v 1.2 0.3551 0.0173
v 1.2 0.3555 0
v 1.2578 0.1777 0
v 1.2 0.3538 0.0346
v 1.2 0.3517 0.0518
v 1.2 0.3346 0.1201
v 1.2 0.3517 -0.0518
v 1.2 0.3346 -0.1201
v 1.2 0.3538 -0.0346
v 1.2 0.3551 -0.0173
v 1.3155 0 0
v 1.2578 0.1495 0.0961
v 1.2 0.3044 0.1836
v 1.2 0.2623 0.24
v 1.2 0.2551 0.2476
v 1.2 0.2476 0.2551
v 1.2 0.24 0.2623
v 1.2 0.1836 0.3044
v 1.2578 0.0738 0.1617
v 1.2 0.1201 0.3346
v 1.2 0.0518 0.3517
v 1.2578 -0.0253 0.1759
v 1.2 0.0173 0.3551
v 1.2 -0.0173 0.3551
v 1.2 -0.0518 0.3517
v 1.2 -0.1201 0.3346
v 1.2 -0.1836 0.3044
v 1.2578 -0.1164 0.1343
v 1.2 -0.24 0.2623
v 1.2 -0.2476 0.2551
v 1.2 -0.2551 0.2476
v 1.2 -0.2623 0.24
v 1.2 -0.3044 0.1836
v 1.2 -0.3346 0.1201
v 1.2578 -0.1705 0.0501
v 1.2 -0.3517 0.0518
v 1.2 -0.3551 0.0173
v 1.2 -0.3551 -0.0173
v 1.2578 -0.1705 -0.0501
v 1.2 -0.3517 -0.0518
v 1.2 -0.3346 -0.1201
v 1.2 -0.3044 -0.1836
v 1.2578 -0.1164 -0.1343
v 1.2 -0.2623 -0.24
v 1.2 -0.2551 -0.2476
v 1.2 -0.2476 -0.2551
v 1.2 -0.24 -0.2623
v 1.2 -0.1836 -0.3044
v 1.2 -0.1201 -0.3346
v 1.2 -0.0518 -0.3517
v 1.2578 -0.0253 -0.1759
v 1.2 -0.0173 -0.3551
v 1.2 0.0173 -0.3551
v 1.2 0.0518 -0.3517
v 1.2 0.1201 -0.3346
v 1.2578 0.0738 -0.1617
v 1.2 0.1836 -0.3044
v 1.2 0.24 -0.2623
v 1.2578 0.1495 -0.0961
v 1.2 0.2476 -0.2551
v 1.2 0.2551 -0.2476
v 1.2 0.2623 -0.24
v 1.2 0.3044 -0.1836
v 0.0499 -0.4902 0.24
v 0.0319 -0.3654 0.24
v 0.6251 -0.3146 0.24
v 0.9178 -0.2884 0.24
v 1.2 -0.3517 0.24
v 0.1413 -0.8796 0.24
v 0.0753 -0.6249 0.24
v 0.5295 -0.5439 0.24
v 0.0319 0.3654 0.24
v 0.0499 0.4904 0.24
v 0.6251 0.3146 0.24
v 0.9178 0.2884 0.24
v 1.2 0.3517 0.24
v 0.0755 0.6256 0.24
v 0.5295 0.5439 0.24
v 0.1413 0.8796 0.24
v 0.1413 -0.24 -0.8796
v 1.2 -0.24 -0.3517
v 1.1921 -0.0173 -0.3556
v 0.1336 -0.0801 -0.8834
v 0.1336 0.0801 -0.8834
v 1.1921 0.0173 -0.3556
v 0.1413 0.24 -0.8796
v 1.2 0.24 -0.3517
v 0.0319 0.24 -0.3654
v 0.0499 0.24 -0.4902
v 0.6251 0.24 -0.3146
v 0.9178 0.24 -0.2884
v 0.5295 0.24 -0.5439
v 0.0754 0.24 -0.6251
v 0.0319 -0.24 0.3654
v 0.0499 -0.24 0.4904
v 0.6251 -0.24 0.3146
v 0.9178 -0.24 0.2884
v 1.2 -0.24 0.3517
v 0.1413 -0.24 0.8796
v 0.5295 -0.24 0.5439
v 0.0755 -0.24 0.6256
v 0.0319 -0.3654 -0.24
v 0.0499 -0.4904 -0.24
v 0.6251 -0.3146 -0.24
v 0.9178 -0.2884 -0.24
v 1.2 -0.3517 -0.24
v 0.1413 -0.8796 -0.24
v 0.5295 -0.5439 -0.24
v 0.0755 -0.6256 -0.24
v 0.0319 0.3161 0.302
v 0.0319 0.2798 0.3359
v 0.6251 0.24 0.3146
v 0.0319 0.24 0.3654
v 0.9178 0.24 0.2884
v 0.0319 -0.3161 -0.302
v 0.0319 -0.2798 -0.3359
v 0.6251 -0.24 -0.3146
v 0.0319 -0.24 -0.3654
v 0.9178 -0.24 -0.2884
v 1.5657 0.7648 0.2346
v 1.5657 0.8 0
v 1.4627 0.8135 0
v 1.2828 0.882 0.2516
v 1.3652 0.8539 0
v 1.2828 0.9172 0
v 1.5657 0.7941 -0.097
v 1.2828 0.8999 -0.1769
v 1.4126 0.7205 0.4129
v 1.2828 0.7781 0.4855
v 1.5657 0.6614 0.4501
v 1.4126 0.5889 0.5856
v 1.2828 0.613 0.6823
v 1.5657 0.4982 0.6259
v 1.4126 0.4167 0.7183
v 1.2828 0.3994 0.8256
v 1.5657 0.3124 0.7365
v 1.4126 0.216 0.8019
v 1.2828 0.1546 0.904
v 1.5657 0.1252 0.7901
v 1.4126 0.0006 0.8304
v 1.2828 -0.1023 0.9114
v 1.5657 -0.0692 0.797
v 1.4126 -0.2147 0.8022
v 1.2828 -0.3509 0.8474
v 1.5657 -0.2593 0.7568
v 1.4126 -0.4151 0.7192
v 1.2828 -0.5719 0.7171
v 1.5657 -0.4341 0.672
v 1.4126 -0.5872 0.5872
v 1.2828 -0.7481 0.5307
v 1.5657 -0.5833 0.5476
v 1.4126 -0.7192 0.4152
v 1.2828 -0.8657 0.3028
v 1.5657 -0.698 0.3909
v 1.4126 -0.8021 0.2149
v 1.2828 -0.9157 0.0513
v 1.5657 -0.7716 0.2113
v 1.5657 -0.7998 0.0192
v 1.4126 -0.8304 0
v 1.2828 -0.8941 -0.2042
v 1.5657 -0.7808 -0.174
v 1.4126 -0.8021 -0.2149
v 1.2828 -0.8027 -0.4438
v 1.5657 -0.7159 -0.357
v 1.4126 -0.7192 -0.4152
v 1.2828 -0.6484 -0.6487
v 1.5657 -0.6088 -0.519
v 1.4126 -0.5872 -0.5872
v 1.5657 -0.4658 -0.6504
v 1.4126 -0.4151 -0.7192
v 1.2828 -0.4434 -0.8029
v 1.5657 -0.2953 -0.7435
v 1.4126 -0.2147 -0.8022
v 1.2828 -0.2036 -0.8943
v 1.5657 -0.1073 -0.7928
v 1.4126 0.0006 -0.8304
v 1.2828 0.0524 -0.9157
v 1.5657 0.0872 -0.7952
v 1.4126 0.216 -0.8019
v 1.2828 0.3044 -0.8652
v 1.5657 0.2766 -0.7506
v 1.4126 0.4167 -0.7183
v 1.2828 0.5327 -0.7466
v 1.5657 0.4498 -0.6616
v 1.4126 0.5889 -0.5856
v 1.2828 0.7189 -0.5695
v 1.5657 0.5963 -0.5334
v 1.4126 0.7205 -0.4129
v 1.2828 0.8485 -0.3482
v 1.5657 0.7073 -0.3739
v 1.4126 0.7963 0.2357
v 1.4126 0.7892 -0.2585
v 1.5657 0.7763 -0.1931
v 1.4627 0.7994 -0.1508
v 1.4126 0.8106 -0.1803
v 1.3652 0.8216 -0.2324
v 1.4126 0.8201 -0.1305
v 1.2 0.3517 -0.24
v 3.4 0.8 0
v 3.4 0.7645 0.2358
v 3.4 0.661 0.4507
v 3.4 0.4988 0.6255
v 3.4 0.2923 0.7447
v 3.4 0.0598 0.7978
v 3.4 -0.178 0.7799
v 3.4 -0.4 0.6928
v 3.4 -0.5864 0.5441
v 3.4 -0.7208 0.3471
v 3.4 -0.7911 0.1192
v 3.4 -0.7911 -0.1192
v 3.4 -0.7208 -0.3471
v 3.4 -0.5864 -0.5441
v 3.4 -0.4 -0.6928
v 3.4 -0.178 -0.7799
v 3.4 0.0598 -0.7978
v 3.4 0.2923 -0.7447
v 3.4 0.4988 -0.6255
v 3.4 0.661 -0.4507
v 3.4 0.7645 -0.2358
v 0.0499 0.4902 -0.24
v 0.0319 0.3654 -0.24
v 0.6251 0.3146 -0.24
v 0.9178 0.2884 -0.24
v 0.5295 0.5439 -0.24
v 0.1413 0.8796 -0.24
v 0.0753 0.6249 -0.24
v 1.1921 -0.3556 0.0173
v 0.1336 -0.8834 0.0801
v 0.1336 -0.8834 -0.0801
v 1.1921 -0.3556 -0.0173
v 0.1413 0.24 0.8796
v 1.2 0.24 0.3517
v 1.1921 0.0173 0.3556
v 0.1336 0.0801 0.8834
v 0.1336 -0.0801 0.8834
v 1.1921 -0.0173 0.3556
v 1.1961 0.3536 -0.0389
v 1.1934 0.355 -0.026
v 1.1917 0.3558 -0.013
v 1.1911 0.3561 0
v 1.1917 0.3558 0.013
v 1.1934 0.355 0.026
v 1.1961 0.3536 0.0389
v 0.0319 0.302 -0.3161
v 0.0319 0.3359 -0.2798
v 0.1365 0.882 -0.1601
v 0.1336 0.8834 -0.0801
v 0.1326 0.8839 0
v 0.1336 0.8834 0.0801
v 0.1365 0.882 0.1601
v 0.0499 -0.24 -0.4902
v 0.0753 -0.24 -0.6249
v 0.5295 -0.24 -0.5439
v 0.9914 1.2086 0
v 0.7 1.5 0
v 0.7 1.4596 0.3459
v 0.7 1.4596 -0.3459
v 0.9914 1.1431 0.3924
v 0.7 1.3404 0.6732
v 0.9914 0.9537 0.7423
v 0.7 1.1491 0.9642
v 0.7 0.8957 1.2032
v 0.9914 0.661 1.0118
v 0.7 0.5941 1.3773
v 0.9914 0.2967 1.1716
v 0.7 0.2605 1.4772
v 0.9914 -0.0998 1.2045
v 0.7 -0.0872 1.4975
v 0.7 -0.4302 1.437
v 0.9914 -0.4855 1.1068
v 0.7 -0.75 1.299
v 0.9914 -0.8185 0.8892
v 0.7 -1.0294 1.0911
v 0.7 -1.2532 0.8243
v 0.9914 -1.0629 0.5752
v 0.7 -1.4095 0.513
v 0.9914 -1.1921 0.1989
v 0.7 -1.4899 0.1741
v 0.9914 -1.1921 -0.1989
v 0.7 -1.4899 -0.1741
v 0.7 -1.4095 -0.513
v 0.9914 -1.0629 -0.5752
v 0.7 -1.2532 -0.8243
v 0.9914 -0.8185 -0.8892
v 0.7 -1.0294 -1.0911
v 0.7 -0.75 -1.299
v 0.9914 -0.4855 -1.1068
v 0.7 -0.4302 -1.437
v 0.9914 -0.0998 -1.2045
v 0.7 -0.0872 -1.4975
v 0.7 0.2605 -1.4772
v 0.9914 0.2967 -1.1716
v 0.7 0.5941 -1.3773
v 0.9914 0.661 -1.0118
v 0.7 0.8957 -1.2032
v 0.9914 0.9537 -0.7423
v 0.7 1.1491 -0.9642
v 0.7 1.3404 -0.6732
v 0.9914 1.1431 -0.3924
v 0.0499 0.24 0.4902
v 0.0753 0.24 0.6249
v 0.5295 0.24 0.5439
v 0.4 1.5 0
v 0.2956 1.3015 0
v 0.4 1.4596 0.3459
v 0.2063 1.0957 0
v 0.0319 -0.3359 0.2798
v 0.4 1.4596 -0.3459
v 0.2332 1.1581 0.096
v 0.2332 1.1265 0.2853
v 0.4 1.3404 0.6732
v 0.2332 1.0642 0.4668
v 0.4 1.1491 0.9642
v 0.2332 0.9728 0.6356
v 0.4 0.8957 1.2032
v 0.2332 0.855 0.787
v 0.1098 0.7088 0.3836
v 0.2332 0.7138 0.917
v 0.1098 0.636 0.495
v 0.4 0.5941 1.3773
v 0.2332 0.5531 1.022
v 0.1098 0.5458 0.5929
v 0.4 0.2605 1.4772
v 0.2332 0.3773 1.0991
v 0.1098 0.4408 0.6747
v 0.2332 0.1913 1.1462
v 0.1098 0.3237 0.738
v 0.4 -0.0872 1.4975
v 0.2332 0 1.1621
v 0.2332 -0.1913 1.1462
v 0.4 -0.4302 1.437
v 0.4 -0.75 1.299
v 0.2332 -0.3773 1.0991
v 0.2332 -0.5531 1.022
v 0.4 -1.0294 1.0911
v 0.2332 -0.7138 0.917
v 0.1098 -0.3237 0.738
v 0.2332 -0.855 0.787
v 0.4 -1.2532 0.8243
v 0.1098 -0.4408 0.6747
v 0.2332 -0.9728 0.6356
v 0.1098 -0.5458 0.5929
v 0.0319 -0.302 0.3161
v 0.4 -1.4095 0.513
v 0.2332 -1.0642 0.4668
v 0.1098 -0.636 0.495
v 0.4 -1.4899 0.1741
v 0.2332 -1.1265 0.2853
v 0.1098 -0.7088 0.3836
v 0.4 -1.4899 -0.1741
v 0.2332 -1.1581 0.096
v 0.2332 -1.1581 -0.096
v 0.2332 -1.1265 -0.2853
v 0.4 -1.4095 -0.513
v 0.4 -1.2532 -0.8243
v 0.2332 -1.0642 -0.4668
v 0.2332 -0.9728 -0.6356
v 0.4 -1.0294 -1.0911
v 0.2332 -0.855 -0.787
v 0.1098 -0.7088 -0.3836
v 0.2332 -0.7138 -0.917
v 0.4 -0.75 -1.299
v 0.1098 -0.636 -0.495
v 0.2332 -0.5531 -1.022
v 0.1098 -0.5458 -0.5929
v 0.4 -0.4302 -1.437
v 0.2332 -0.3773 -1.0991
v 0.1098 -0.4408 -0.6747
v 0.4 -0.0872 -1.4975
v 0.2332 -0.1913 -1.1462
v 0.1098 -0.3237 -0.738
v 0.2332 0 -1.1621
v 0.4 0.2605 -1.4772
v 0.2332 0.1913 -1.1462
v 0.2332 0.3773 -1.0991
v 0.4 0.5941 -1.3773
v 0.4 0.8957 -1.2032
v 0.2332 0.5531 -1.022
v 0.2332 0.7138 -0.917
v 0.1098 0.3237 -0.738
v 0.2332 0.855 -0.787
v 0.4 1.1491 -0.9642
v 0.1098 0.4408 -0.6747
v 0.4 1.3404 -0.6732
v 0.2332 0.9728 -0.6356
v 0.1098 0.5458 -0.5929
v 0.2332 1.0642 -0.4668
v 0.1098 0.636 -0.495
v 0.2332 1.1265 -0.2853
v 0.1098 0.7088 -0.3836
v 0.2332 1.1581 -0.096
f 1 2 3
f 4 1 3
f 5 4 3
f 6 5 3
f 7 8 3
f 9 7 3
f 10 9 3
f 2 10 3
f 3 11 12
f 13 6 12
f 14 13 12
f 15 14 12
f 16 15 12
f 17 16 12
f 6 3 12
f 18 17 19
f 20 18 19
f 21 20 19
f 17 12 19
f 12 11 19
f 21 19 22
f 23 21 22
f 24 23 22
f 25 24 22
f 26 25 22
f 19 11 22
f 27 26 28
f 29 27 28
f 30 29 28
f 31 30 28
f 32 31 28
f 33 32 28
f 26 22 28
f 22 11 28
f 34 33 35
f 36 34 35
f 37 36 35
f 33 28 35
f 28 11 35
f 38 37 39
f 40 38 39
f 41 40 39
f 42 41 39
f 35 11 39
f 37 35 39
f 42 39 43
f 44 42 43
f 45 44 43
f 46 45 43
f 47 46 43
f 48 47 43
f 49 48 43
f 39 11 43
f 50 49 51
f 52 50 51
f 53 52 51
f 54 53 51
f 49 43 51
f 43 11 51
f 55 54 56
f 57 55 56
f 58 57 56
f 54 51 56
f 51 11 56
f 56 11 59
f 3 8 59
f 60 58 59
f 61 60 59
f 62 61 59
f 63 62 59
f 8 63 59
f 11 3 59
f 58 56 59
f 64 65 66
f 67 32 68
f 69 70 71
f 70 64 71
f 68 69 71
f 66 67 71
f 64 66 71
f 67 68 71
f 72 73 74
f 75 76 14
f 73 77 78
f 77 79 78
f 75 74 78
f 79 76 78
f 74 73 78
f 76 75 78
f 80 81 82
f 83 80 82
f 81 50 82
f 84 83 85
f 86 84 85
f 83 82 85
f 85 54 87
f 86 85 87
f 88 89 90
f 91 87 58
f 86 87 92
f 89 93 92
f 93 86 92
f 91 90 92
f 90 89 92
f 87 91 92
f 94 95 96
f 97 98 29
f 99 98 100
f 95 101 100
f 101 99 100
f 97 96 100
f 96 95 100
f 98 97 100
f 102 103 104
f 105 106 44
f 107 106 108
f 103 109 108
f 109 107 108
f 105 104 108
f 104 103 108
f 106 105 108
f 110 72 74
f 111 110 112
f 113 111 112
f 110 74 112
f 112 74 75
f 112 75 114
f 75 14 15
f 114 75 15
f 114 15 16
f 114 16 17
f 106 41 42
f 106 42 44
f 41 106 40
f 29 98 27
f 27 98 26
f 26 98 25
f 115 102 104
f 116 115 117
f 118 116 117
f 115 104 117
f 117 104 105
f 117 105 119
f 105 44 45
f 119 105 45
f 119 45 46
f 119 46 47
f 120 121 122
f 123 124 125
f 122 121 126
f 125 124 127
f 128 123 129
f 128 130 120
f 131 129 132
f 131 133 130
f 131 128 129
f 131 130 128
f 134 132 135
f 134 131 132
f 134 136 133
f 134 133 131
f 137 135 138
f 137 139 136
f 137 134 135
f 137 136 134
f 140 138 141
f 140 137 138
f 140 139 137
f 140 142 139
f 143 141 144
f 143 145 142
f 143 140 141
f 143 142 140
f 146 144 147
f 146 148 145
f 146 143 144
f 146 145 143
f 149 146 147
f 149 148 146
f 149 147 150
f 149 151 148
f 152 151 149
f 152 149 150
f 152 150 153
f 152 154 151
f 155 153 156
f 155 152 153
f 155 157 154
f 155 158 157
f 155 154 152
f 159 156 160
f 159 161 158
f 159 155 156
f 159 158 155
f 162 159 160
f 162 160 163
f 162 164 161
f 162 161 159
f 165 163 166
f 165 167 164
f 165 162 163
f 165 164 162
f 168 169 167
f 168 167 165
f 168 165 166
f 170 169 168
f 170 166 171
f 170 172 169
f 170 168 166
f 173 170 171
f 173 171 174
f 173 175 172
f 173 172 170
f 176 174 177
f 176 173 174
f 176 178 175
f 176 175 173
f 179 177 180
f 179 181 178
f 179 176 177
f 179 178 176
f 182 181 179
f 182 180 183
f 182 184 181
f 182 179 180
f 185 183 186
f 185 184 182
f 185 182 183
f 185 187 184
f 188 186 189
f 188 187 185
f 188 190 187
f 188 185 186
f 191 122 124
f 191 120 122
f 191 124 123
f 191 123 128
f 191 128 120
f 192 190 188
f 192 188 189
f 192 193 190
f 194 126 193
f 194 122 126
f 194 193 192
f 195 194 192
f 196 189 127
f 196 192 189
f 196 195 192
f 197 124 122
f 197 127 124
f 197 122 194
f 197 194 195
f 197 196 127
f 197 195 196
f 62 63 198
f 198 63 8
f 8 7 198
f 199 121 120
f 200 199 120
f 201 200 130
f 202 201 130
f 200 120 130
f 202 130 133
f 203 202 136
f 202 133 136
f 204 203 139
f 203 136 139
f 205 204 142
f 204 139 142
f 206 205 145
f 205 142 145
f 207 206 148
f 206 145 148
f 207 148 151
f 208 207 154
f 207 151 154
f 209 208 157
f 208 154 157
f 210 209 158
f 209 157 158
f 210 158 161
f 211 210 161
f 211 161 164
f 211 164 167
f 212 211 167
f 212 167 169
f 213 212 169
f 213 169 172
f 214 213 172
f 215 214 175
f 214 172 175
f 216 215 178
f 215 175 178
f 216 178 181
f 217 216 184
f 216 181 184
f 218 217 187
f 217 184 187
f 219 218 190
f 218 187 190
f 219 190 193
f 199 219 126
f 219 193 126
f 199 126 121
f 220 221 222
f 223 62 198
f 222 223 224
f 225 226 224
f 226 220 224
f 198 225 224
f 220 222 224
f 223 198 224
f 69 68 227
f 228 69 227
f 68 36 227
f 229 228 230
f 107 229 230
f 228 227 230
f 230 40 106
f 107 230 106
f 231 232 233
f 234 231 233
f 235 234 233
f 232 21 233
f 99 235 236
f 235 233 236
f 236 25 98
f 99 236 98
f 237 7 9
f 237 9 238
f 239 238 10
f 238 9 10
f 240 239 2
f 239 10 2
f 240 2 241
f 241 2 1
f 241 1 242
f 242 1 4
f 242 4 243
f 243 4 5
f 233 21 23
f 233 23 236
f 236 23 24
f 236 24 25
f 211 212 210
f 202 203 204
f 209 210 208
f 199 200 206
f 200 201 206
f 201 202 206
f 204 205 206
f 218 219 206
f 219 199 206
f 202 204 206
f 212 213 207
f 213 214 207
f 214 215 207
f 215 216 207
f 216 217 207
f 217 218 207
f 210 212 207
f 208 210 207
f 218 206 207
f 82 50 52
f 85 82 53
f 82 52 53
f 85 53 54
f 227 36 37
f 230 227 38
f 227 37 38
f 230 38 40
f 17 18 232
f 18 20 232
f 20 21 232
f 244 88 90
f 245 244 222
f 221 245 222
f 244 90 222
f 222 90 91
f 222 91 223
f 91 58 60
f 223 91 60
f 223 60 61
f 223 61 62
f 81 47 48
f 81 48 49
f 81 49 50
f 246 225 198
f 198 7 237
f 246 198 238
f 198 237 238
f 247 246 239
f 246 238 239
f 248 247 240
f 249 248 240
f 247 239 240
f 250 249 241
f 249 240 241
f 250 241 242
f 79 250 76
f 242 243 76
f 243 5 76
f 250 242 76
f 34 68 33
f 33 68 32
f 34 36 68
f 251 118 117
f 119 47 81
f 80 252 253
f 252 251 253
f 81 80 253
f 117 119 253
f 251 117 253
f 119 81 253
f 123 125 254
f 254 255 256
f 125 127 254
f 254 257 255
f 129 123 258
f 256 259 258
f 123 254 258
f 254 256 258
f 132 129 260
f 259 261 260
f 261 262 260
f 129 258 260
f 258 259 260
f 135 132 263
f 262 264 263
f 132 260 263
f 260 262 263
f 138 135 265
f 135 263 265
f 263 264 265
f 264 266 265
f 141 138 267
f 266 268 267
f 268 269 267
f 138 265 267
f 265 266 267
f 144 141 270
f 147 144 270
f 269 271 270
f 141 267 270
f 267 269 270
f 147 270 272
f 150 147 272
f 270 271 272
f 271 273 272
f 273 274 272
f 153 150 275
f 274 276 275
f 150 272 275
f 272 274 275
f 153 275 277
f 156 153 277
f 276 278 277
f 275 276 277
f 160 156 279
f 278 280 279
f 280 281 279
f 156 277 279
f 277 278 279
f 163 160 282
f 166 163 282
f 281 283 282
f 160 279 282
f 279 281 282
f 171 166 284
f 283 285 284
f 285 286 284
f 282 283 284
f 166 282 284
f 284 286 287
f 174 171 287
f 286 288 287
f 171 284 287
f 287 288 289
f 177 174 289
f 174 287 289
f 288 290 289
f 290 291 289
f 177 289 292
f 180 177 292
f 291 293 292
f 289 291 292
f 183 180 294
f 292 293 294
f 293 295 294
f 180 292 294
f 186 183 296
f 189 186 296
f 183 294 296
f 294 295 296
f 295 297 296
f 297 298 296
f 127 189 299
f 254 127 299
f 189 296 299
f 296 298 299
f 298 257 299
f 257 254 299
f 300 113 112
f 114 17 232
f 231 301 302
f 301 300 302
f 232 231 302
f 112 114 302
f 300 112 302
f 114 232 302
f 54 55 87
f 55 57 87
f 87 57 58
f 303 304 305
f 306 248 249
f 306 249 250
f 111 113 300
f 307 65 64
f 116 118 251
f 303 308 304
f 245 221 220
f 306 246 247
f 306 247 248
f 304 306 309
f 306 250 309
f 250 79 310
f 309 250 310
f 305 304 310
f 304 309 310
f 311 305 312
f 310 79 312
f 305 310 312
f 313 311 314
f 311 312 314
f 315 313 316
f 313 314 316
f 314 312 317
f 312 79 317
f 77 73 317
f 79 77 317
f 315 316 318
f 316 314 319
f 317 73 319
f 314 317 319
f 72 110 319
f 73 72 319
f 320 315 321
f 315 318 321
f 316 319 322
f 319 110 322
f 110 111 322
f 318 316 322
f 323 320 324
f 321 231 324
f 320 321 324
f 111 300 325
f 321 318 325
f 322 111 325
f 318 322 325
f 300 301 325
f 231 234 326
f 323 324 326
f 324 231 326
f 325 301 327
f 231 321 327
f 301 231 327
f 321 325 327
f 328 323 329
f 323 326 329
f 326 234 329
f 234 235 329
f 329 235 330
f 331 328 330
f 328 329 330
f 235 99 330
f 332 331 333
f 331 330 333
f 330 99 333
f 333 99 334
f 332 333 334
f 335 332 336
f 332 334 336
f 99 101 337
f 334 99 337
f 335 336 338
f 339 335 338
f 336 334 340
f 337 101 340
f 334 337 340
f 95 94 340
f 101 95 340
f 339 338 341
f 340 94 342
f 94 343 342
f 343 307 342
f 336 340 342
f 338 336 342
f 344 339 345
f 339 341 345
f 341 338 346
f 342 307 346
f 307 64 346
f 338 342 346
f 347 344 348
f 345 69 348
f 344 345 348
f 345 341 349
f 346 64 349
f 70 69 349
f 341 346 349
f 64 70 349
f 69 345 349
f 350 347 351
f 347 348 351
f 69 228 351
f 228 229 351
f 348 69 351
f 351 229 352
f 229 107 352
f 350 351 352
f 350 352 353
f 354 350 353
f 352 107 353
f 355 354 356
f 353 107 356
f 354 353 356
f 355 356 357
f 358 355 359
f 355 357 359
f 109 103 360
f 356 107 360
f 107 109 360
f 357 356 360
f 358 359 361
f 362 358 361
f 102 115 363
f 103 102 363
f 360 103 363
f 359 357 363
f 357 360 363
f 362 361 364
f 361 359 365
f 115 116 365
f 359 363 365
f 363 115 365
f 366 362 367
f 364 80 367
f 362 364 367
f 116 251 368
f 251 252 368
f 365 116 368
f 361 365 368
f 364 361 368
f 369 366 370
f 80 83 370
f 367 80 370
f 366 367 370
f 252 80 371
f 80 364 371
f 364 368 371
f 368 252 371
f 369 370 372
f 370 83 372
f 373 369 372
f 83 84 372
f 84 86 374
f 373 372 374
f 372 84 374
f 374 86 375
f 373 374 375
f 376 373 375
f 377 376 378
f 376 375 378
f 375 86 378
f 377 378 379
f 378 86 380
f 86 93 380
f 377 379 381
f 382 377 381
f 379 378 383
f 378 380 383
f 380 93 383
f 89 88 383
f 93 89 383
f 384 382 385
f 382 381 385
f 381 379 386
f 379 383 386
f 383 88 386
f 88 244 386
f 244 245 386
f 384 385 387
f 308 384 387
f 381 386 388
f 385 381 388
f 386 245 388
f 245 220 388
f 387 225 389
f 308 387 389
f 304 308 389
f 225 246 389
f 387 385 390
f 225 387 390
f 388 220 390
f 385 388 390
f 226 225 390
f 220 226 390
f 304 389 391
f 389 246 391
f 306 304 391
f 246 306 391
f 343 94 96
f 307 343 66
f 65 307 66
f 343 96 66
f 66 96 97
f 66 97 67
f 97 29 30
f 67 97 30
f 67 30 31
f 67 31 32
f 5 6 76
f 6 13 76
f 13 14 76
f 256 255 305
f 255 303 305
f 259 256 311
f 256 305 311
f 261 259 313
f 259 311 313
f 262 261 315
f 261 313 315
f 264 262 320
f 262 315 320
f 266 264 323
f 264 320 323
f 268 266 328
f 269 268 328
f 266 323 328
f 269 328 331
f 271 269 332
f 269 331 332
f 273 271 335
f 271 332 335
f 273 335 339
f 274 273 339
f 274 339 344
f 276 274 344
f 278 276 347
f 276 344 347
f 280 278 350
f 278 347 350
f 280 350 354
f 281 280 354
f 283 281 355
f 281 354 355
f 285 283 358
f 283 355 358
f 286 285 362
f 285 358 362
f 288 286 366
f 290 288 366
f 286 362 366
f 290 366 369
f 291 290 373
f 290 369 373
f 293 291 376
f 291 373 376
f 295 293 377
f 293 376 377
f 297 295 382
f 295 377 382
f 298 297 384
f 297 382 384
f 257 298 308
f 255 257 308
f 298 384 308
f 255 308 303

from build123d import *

# Parameters (mm, degrees)
FILLET1_R    = 0.4
SKETCH3_W    = 0.48
SKETCH3_H    = 1.9
SKETCH4_W    = 0.48
SKETCH4_H    = 0.703404182
RECPAT_COUNT = 2
RECPAT_ANGLE = 90


with BuildPart() as part:
    # BodySke → Base-Revolve (revolve)
    with BuildSketch(Plane.XY):
        with BuildLine():
            Line((0, 0), (3.4, 0))
            Line((3.4, 0), (3.4, 0.8))
            Line((3.4, 0.8), (1.4, 0.8))
            Line((1.4, 0.8), (0.7, 1.5))
            Line((0.7, 1.5), (0.4, 1.5))
            ThreePointArc((0.4, 1.5), (0.101717244, 0.776208735), (0, 0))
        make_face()
    revolve(axis=Axis((-15.875, 0, 0), (1, 0, 0)))

    # Fillet1
    fillet1_edges = [part.edges().sort_by_distance(p)[0] for p in [
        (1.4, -0.8, 0),
    ]]
    fillet(fillet1_edges, radius=FILLET1_R)

    # Sketch3 → Recess section 0
    with BuildSketch(Plane(origin=(0, 0, 0), x_dir=(0, 0, -1), z_dir=(1, 0, 0))):
        Rectangle(SKETCH3_W, SKETCH3_H)
    # Sketch4 → Recess section 1
    with BuildSketch(Plane(origin=(1.2, 0, 0), x_dir=(0, 0, -1), z_dir=(1, 0, 0))):
        Rectangle(SKETCH4_W, SKETCH4_H)
    recess = loft(mode=Mode.SUBTRACT)

    # RecPat: Recess ×2 about axis
    recpat_axis = Axis((0, 0, 0), (1, 0, 0))
    for i in range(1, RECPAT_COUNT):
        add(recess.rotate(recpat_axis, i * RECPAT_ANGLE / (RECPAT_COUNT - 1)), mode=Mode.SUBTRACT)

    # RecCorSke → RecessCore (revolve, cut)
    with BuildSketch(Plane.XY):
        Polygon((0, 0), (0, 0.439412174), (1.2, 0.3555), (1.315508952, 0), align=None)
    revolve(axis=Axis((-3.175, 0, 0), (1, 0, 0)), mode=Mode.SUBTRACT)


solid = part.part
